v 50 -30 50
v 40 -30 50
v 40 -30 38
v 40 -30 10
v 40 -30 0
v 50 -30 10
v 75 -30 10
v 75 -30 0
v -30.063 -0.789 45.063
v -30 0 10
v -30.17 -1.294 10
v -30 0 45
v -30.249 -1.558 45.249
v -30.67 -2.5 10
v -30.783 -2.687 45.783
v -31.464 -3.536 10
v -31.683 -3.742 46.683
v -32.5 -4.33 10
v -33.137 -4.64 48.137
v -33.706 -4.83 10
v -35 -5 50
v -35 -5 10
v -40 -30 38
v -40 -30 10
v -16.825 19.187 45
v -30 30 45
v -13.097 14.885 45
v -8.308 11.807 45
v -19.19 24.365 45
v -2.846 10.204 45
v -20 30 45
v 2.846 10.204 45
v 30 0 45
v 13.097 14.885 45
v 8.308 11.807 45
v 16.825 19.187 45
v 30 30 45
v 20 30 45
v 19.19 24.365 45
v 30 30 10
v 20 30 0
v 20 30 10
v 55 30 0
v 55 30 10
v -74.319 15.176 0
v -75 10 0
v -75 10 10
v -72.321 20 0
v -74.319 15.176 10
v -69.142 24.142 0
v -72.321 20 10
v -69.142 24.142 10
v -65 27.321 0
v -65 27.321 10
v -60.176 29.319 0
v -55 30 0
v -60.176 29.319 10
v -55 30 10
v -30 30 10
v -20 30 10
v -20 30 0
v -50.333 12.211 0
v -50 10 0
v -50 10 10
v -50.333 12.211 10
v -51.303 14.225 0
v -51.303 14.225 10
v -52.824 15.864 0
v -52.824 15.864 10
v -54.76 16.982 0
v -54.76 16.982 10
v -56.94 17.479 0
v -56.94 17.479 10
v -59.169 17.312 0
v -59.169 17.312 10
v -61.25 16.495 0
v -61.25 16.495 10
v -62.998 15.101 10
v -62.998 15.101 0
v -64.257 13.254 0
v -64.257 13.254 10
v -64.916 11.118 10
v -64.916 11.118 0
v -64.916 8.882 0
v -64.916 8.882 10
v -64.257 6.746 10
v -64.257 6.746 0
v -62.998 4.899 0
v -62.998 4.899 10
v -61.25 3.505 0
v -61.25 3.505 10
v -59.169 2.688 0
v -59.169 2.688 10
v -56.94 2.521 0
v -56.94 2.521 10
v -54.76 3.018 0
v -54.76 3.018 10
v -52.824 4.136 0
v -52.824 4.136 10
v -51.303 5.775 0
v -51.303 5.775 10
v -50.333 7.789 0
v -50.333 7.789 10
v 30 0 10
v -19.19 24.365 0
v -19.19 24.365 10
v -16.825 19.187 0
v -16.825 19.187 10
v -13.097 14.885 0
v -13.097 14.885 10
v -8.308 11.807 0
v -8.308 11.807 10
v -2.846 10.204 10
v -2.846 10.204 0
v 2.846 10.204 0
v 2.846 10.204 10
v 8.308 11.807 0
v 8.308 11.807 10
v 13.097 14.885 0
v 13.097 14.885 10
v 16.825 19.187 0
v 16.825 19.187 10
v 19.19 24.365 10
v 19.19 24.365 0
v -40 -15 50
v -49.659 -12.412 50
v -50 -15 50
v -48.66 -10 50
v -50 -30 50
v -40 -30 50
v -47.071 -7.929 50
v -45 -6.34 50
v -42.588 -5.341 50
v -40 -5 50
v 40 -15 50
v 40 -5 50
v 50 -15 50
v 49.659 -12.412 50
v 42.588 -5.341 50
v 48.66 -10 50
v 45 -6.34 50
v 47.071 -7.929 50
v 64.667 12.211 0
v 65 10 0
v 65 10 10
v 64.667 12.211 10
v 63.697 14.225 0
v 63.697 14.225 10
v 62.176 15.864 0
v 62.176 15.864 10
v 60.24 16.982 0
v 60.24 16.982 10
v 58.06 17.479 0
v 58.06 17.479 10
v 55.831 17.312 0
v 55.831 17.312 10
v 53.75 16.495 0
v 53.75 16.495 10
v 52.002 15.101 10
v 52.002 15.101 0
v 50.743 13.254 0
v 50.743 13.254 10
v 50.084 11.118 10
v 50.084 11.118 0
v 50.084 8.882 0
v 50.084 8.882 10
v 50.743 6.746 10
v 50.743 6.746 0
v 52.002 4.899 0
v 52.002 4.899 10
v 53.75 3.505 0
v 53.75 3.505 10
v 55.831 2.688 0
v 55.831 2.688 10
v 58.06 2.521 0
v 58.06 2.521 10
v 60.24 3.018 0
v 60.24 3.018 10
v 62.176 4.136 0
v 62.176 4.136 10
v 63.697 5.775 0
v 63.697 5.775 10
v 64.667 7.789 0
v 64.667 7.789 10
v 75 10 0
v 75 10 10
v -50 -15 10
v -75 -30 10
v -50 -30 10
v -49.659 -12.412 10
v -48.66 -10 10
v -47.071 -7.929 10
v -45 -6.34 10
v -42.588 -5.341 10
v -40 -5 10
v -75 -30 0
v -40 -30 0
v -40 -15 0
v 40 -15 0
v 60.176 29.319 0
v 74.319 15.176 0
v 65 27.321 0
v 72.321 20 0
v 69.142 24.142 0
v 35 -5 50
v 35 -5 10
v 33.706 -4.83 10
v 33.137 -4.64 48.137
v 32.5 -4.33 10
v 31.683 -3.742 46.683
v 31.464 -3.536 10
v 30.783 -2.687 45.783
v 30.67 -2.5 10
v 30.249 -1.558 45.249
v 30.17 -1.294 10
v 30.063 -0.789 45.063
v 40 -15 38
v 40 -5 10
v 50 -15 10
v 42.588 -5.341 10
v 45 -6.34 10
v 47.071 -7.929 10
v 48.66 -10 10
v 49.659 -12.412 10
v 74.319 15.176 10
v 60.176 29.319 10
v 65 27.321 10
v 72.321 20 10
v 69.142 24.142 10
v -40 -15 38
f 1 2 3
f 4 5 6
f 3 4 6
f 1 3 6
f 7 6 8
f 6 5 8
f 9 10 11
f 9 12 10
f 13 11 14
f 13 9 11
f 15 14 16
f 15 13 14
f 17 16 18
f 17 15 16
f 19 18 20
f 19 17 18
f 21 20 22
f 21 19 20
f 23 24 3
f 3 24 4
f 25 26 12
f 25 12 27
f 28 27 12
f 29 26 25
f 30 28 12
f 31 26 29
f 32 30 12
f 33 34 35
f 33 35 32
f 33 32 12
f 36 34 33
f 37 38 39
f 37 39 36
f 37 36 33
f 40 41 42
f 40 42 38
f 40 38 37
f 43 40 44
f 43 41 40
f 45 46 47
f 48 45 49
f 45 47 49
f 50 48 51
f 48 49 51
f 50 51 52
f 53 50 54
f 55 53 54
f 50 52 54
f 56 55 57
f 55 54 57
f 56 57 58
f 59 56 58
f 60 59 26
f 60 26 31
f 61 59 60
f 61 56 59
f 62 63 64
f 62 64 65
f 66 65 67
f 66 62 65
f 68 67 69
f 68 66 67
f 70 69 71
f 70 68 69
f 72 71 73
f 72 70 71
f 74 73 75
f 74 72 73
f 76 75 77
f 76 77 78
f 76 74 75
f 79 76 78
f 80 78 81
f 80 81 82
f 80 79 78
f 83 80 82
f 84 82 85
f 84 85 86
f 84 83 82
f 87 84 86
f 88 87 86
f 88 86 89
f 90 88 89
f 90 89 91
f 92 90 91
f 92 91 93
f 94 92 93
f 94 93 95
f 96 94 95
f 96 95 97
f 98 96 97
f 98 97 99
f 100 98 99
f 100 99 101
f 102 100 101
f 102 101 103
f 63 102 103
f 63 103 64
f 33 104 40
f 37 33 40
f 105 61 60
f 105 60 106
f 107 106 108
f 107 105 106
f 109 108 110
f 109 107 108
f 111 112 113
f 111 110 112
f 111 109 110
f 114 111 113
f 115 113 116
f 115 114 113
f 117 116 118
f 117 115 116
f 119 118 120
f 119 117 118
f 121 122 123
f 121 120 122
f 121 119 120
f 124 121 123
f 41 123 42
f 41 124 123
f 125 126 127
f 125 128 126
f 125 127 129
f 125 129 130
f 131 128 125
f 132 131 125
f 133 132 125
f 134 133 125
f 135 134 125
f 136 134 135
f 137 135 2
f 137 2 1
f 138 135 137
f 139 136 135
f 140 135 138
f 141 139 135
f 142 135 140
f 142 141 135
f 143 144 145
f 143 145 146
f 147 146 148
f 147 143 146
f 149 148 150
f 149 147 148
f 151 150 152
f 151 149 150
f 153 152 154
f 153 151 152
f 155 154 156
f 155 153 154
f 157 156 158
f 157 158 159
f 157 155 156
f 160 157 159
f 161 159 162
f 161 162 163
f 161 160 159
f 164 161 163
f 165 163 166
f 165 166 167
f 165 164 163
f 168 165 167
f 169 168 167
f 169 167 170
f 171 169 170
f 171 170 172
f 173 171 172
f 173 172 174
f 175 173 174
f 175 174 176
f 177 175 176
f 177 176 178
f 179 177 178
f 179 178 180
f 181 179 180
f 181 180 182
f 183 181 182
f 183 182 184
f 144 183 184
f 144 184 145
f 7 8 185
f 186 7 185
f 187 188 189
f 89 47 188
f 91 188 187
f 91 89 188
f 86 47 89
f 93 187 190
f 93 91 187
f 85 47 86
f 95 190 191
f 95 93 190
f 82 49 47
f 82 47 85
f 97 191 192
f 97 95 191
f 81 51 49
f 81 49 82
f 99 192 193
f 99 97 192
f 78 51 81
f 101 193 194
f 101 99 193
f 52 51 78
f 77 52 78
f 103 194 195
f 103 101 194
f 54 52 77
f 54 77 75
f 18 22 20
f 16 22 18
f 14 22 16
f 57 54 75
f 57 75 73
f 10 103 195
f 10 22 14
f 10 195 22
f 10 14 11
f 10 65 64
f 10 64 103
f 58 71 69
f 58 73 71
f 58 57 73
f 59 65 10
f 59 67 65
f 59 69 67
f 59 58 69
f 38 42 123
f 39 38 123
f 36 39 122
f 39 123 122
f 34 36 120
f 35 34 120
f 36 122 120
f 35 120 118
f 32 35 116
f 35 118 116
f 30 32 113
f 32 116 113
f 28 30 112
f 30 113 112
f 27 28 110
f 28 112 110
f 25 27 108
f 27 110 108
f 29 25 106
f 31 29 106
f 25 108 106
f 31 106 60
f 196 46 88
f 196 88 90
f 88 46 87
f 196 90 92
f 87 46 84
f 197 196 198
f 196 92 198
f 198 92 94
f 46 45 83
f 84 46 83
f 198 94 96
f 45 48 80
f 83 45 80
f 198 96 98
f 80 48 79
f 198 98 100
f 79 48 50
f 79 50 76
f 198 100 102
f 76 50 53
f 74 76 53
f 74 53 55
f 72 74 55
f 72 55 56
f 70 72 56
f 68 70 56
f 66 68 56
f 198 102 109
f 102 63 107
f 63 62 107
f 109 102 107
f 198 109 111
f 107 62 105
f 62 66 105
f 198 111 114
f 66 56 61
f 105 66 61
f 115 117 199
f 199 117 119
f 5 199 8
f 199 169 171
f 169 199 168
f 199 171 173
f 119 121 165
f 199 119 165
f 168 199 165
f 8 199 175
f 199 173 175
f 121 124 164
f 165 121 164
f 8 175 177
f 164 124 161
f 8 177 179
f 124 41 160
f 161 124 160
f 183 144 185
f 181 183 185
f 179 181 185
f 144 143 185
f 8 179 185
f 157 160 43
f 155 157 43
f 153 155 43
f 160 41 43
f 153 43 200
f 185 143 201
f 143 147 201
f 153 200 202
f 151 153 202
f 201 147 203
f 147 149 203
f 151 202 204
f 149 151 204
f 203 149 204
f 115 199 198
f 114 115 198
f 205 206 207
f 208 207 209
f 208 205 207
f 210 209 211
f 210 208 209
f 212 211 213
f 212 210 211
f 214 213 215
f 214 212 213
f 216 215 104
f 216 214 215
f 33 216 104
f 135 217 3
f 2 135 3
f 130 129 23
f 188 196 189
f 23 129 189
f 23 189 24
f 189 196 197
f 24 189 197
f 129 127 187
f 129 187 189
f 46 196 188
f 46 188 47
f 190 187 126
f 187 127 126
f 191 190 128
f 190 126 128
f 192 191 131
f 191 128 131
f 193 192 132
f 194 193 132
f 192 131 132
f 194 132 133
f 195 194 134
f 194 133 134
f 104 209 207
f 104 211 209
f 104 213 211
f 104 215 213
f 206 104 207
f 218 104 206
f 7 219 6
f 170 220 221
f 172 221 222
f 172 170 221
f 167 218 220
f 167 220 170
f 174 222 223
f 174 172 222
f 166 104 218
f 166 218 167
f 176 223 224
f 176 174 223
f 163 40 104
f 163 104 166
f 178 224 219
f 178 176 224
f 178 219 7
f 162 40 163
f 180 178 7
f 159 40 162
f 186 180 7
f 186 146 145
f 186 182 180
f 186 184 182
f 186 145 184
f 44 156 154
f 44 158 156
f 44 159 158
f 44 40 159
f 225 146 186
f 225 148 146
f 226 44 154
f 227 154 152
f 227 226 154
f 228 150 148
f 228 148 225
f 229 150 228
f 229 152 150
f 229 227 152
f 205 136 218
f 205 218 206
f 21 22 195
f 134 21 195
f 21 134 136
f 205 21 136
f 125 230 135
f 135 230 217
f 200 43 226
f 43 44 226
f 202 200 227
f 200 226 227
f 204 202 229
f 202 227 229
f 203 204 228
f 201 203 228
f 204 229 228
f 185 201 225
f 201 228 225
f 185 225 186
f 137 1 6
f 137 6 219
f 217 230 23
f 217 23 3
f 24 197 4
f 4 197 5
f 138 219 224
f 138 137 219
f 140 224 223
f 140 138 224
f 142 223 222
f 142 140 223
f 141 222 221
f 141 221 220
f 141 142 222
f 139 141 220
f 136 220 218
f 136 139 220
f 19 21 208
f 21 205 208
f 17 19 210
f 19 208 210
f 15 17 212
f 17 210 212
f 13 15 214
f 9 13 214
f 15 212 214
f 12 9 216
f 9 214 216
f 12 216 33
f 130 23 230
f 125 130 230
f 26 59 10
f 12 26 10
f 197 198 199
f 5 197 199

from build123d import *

# Parameters (mm, degrees)
ESBO_O1_W                  = 150
ESBO_O1_H                  = 60
RESSALTO_EXTRUS_O1_DEPTH   = 10
RESSALTO_EXTRUS_O2_DEPTH   = 40
FILETE1_R                  = 20
FILETE2_R                  = 10
CORTE_EXTRUS_O2_DEPTH      = 10
CORTE_EXTRUS_O2_DEPTH_BACK = 10
ESBO_O4_R                  = 7.5
RESSALTO_EXTRUS_O5_START   = 10
RESSALTO_EXTRUS_O5_DEPTH   = 35
CORTE_EXTRUS_O3_START      = -10
ESBO_O7_R                  = 20
CORTE_EXTRUS_O3_DEPTH      = 10
FILETE4_R                  = 5
ESBO_O8_W                  = 80
ESBO_O8_H                  = 15
RESSALTO_EXTRUS_O6_DEPTH   = 38


with BuildPart() as part:
    # Esboço1 → Ressalto-extrusão1 (new body)
    with BuildSketch(Plane.XY):
        Rectangle(ESBO_O1_W, ESBO_O1_H)
    extrude(amount=RESSALTO_EXTRUS_O1_DEPTH)

    # Esboço3 → Ressalto-extrusão2 (add)
    with BuildSketch(Plane.XY.offset(10)):
        Polygon((-50, -30), (-40, -30), (-40, -15), (40, -15), (40, -30), (50, -30), (50, -5), (-50, -5), align=None)
    extrude(amount=RESSALTO_EXTRUS_O2_DEPTH)

    # Filete1
    filete1_edges = [part.edges().sort_by_distance(p)[0] for p in [
        (-75, 30, 5),
        (75, 30, 5),
    ]]
    fillet(filete1_edges, radius=FILETE1_R)

    # Filete2
    filete2_edges = [part.edges().sort_by_distance(p)[0] for p in [
        (50, -5, 30),
        (-50, -5, 30),
    ]]
    fillet(filete2_edges, radius=FILETE2_R)

    # Esboço4 → Corte-extrusão2 (cut, two sides: drawn at the far end of the back side and taken through both)
    with BuildSketch(Plane.XY.offset(-CORTE_EXTRUS_O2_DEPTH_BACK)):
        with Locations((-57.5, 10)):
            Circle(ESBO_O4_R)
        with Locations((57.5, 10)):
            Circle(ESBO_O4_R)
    extrude(amount=CORTE_EXTRUS_O2_DEPTH + CORTE_EXTRUS_O2_DEPTH_BACK, mode=Mode.SUBTRACT)

    # Esboço5 → Ressalto-extrusão5 (add)
    with BuildSketch(Plane.XY.offset(RESSALTO_EXTRUS_O5_START)):
        with BuildLine():
            Line((-30, 30), (-30, -5))
            Line((-30, -5), (30, -5))
            Line((30, -5), (30, 30))
            Line((30, 30), (20, 30))
            ThreePointArc((20, 30), (0, 10), (-20, 30))
            Line((-20, 30), (-30, 30))
        make_face()
    extrude(amount=RESSALTO_EXTRUS_O5_DEPTH)

    # Esboço7 → Corte-extrusão3 (cut)
    with BuildSketch(Plane.XY.offset(10).offset(CORTE_EXTRUS_O3_START)):
        with Locations((0, 30)):
            Circle(ESBO_O7_R)
    extrude(amount=CORTE_EXTRUS_O3_DEPTH, mode=Mode.SUBTRACT)

    # Filete4
    filete4_edges = [part.edges().sort_by_distance(p)[0] for p in [
        (0, -5, 45),
        (-30, -5, 27.5),
        (30, -5, 27.5),
    ]]
    fillet(filete4_edges, radius=FILETE4_R - 0.0001)  # a hair under: the kernel refuses the full size

    # Esboço8 → Ressalto-extrusão6 (add)
    with BuildSketch(Plane.XY):
        with Locations((0, -22.5)):
            Rectangle(ESBO_O8_W, ESBO_O8_H)
    extrude(amount=RESSALTO_EXTRUS_O6_DEPTH)


solid = part.part
